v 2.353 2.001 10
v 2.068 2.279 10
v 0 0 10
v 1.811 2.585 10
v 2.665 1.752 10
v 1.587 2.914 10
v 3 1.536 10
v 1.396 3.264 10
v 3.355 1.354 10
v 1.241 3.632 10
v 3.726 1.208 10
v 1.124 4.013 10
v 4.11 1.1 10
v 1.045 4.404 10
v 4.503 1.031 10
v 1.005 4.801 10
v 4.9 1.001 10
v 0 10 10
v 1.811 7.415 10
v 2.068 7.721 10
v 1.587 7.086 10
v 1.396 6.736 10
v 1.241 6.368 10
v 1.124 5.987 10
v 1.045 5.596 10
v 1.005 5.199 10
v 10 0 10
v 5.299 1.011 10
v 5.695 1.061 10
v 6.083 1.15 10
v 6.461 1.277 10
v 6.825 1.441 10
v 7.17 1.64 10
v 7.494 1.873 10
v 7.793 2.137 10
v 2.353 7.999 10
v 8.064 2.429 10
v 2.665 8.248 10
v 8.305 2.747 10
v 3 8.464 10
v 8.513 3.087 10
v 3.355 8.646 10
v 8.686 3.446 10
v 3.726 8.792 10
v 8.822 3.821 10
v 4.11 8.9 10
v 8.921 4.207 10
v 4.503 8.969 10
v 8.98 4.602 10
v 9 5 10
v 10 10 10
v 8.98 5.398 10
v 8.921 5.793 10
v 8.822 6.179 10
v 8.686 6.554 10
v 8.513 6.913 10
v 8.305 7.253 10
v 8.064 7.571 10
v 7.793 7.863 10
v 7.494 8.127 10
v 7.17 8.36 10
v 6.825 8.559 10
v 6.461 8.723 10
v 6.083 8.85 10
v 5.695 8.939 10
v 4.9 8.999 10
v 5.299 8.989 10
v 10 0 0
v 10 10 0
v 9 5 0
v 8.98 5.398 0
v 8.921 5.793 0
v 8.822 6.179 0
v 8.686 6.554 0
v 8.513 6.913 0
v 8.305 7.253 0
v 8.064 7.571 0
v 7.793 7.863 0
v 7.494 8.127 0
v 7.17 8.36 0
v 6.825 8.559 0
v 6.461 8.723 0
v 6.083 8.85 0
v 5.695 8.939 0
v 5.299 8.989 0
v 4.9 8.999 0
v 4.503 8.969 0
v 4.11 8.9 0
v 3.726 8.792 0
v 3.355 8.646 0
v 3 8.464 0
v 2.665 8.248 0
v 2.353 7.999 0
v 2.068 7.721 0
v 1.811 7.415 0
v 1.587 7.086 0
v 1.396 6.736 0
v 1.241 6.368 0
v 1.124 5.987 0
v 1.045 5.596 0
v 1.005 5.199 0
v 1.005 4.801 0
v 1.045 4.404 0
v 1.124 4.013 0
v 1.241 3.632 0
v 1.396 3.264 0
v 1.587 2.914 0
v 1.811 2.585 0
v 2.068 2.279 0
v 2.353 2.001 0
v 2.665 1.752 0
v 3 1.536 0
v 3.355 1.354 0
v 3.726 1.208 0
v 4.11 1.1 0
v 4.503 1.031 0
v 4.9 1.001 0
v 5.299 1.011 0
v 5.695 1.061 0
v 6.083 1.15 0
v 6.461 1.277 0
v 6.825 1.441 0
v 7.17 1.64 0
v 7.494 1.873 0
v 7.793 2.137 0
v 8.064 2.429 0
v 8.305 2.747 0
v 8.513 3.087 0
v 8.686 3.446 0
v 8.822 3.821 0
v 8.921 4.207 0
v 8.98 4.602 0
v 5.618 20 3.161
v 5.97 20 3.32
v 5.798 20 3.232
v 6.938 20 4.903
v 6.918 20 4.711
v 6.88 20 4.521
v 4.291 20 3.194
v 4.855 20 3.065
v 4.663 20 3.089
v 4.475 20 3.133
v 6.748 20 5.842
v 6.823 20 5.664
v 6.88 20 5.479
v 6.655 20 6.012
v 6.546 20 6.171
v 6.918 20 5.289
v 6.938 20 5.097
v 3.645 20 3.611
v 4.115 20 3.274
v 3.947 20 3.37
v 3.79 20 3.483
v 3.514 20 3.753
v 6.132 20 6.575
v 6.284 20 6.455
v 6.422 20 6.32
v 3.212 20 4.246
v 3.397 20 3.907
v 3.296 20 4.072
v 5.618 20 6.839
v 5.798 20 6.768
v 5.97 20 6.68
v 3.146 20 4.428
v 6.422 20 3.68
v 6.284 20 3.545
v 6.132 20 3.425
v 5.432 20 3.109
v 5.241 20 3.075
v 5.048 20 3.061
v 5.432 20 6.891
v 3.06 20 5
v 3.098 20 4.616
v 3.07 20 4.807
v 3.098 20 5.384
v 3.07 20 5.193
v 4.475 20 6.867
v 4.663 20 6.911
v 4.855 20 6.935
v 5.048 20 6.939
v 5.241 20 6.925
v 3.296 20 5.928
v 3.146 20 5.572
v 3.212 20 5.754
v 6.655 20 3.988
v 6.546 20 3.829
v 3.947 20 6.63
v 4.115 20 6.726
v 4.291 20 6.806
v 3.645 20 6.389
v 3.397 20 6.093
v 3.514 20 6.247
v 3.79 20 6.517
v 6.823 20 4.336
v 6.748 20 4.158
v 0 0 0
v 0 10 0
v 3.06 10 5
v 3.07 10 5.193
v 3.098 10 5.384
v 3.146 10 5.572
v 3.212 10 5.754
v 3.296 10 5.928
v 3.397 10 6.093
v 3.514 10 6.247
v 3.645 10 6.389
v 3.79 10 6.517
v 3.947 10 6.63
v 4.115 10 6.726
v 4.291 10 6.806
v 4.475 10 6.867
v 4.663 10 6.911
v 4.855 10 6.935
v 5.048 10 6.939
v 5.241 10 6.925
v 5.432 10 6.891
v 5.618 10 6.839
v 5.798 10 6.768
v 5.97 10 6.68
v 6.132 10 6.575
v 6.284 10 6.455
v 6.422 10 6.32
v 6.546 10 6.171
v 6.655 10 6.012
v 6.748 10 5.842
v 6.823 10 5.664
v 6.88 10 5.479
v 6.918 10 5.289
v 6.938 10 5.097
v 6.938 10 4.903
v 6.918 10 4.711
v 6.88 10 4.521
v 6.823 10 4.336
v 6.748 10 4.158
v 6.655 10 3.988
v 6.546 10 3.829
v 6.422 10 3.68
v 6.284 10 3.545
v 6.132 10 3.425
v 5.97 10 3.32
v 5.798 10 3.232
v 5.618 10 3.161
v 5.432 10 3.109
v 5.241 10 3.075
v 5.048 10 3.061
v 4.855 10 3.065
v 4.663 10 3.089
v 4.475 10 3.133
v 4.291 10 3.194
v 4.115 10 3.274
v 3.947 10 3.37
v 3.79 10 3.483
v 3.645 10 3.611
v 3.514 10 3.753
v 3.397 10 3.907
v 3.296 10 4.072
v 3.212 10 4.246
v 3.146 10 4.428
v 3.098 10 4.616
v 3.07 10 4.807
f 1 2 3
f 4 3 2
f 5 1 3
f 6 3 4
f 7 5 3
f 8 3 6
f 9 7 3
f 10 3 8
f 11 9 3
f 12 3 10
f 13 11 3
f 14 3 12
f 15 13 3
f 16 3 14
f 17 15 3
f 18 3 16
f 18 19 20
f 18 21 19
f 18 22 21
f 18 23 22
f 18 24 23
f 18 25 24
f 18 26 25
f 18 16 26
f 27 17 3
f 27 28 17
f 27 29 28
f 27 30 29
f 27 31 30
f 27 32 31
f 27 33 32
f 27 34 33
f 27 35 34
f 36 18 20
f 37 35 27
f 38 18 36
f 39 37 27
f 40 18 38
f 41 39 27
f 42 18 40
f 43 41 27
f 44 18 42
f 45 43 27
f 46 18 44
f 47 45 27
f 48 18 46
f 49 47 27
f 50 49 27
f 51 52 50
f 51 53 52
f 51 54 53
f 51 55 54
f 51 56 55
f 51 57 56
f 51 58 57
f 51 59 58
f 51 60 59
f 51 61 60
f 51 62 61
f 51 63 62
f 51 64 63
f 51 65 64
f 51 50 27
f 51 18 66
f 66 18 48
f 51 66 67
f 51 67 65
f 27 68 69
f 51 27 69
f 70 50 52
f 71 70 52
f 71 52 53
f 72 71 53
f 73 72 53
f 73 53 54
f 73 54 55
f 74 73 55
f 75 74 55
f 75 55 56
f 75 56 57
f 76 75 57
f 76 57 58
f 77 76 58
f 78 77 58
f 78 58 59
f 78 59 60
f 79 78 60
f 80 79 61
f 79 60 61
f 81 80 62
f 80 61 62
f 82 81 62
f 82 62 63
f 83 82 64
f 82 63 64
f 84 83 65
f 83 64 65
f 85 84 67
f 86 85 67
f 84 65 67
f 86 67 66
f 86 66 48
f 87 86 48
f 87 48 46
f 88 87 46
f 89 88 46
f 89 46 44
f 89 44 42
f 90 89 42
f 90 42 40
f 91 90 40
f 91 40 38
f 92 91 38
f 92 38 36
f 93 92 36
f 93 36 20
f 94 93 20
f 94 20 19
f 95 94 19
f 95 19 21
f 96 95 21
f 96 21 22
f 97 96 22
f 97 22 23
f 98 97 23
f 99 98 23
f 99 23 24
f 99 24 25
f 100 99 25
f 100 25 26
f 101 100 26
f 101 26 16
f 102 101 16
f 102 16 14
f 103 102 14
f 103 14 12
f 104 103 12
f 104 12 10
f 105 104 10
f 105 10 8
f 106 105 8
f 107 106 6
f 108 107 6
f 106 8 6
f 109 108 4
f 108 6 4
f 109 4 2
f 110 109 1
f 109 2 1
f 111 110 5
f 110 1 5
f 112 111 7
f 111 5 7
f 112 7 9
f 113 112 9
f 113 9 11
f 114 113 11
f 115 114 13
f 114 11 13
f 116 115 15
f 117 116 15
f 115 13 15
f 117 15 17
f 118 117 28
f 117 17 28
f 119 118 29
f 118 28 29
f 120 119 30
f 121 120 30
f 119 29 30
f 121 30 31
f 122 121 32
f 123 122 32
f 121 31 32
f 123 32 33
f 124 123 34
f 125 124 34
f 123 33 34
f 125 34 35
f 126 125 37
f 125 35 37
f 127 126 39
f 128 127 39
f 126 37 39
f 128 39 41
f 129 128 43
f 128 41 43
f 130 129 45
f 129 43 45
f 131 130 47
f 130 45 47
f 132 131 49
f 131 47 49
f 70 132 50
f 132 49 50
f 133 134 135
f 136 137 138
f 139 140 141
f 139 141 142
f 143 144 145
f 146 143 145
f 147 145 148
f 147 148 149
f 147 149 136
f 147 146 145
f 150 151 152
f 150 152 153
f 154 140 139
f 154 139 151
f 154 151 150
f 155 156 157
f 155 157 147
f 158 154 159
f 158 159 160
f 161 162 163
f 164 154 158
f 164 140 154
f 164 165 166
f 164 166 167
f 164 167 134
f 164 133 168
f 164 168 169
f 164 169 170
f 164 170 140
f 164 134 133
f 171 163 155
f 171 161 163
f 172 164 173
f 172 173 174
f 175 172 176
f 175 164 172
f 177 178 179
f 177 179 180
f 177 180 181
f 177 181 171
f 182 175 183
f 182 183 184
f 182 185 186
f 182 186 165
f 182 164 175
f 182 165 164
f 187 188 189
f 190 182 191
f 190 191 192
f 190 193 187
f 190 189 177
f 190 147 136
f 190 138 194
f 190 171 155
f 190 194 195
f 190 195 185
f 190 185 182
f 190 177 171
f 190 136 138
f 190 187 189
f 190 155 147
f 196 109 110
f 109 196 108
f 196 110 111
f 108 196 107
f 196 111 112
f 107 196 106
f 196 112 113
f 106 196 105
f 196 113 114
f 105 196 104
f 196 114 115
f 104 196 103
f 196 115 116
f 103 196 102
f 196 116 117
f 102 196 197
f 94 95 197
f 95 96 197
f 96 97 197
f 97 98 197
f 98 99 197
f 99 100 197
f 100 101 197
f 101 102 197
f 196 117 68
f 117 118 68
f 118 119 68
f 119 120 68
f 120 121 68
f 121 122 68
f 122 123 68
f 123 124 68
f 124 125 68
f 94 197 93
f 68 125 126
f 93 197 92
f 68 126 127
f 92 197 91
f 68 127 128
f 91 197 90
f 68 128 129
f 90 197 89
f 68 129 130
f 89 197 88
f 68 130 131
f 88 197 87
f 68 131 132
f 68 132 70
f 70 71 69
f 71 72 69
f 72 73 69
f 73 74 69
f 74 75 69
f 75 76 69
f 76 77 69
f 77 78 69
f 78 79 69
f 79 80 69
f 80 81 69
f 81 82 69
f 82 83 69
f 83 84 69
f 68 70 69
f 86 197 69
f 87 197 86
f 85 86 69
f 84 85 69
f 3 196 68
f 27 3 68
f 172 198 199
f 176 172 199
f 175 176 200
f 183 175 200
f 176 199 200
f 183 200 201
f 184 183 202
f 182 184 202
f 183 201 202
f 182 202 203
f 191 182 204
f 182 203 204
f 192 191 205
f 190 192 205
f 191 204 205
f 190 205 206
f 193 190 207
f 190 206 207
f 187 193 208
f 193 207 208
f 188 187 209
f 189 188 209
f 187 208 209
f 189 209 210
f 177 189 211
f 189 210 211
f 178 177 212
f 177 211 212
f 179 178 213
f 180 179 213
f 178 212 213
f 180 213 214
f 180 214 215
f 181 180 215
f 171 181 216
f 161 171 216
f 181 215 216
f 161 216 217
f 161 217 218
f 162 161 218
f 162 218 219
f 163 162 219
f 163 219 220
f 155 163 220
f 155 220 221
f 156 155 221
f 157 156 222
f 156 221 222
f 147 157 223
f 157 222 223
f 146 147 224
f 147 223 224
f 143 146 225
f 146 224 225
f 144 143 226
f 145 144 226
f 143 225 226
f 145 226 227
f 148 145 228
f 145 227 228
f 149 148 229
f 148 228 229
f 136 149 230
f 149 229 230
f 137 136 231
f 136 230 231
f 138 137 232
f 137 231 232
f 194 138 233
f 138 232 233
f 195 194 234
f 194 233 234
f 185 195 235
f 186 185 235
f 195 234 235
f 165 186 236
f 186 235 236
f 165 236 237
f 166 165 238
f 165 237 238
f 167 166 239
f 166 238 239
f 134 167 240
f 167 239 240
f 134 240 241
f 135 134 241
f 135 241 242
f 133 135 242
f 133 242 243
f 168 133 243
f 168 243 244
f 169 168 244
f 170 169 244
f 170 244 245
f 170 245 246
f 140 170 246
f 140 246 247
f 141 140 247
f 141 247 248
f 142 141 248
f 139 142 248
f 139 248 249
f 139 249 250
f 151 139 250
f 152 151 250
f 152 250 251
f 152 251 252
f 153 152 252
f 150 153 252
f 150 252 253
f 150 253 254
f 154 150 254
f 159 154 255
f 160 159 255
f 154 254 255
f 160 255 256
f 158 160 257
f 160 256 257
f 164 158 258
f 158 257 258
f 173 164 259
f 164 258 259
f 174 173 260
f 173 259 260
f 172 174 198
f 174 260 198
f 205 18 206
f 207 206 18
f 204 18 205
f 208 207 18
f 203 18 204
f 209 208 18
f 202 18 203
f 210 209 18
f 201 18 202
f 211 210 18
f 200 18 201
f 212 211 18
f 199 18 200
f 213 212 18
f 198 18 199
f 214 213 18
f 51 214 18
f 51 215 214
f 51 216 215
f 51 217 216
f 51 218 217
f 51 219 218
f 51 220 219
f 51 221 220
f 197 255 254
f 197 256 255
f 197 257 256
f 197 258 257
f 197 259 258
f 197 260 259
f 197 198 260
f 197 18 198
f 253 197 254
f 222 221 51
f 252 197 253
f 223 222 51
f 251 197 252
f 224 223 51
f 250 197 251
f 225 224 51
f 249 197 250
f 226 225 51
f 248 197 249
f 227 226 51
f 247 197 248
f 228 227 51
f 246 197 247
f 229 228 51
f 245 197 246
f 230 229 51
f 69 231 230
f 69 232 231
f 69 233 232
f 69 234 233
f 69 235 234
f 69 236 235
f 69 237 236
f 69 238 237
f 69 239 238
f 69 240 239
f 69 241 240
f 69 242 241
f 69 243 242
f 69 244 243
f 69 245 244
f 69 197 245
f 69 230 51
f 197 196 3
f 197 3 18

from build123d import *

# Parameters (mm, degrees)
BOX_W        = 10
BOX_H        = 10
BOX_DEPTH    = 10
SKETCH_R     = 4
POCKET_DEPTH = 15
SKETCH001_R  = 1.94
PAD_DEPTH    = 10


with BuildPart() as part:
    # Box → Box (new body)
    with BuildSketch(Plane.XY):
        with Locations((5, 5)):
            Rectangle(BOX_W, BOX_H)
    extrude(amount=BOX_DEPTH)

    # Sketch (on Face6 of BaseFeature) → Pocket (cut)
    with BuildSketch(Plane.XY.offset(10)):
        with Locations((5, 5)):
            Circle(SKETCH_R)
    extrude(amount=-POCKET_DEPTH, mode=Mode.SUBTRACT)

    # Sketch001 (on Face4 of Pocket) → Pad (join)
    with BuildSketch(Plane(origin=(0, 10, 0), x_dir=(-1, 0, 0), z_dir=(0, 1, 0))):
        with Locations((-5, 5)):
            Circle(SKETCH001_R)
    extrude(amount=PAD_DEPTH)


solid = part.part
